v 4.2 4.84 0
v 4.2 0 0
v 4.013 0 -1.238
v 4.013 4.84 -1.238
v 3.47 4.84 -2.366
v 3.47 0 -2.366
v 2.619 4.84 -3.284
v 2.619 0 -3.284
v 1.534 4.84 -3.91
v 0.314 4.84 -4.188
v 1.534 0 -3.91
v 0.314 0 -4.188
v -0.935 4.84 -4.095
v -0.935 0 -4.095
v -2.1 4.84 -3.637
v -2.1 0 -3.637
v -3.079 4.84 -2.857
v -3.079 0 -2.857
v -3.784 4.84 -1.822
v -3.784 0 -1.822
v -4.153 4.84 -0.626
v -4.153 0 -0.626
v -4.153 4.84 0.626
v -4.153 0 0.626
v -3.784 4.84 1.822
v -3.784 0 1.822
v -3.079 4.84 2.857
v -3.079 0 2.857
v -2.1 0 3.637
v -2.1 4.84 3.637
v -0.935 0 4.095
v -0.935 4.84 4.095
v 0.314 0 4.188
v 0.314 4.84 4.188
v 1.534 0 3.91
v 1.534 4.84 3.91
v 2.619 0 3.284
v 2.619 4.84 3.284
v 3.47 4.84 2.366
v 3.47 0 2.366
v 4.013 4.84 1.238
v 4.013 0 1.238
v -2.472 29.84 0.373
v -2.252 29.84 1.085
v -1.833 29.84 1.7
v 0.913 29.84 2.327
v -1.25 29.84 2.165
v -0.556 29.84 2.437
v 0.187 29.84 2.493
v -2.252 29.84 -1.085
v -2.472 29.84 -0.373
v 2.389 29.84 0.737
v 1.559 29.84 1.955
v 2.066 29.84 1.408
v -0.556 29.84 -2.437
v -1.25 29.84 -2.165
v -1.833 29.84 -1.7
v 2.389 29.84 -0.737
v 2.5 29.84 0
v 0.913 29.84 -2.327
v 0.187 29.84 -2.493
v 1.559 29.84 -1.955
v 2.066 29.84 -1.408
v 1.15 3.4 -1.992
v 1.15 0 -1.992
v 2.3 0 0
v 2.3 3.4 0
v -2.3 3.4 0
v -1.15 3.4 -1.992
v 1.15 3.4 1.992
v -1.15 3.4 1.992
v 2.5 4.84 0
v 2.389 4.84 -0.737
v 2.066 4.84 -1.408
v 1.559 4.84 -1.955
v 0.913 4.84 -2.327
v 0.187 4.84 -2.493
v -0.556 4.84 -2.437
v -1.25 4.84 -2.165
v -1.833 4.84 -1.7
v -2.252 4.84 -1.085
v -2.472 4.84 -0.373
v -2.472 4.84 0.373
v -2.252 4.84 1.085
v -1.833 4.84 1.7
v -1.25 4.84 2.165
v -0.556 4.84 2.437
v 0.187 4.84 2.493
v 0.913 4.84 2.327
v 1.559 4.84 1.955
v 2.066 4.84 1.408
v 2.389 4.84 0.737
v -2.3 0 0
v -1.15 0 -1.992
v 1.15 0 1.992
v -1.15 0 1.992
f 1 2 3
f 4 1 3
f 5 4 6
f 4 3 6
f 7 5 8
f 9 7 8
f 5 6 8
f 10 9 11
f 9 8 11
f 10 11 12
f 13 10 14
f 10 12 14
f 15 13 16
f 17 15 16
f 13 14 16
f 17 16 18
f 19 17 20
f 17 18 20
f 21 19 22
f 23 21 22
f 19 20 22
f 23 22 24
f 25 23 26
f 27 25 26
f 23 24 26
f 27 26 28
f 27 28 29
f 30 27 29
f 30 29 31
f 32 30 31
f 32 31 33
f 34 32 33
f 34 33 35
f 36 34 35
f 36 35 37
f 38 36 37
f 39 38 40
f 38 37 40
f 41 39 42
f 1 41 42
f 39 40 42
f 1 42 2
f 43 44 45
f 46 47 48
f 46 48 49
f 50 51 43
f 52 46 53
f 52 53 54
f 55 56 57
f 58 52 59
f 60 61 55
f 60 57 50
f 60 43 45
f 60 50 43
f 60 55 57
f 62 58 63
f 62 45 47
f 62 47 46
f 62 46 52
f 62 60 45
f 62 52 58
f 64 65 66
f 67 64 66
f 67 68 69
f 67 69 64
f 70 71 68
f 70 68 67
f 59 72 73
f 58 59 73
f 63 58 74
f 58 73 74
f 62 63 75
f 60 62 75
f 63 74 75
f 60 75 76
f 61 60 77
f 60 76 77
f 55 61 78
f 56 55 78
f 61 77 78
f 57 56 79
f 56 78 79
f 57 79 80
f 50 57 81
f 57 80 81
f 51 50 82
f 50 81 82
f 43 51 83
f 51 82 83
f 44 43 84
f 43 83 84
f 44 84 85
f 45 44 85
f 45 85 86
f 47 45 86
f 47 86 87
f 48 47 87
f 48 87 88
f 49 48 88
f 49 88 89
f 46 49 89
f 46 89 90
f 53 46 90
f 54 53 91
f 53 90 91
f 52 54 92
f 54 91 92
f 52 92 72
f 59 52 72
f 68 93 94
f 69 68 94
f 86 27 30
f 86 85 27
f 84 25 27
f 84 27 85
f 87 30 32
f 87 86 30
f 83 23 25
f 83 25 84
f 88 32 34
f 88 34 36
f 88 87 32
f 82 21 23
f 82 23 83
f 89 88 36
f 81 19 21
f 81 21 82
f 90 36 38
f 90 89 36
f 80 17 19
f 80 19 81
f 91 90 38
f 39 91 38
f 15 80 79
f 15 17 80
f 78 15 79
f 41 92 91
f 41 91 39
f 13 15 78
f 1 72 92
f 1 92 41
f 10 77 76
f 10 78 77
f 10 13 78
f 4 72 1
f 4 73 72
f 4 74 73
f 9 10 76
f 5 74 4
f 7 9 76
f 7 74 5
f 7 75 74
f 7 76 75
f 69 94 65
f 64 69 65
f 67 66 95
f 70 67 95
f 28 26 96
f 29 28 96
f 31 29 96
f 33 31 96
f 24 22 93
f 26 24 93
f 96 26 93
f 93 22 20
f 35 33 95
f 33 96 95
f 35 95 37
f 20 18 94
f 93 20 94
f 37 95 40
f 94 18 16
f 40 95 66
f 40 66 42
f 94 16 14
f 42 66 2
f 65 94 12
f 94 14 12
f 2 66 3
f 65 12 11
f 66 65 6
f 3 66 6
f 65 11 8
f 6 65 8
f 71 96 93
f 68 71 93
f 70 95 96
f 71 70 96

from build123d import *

# Parameters (mm, degrees)
SKETCH_1_R          = 4.2
EXTRUDE_1_DEPTH     = 4.84
SKETCH_2_R          = 2.5
EXTRUDE_2_DEPTH     = 25
CUT_EXTRUDE_1_DEPTH = 3.4


with BuildPart() as part:
    # 草图1 → 凸台-拉伸1 (new body)
    with BuildSketch(Plane(origin=(0, 0, 0), x_dir=(1, 0, 0), z_dir=(0, 1, 0))):
        Circle(SKETCH_1_R)
    extrude(amount=EXTRUDE_1_DEPTH)

    # 草图2 → 凸台-拉伸2 (add)
    with BuildSketch(Plane(origin=(0, 4.84, 0), x_dir=(1, 0, 0), z_dir=(0, 1, 0))):
        Circle(SKETCH_2_R)
    extrude(amount=EXTRUDE_2_DEPTH)

    # 草图3 → 切除-拉伸1 (cut)
    with BuildSketch(Plane.XZ):
        Polygon((2.3, 0), (1.15, 1.991858429), (-1.15, 1.991858429), (-2.3, 0), (-1.15, -1.991858429), (1.15, -1.991858429), align=None)
    extrude(amount=-CUT_EXTRUDE_1_DEPTH, mode=Mode.SUBTRACT)


solid = part.part
